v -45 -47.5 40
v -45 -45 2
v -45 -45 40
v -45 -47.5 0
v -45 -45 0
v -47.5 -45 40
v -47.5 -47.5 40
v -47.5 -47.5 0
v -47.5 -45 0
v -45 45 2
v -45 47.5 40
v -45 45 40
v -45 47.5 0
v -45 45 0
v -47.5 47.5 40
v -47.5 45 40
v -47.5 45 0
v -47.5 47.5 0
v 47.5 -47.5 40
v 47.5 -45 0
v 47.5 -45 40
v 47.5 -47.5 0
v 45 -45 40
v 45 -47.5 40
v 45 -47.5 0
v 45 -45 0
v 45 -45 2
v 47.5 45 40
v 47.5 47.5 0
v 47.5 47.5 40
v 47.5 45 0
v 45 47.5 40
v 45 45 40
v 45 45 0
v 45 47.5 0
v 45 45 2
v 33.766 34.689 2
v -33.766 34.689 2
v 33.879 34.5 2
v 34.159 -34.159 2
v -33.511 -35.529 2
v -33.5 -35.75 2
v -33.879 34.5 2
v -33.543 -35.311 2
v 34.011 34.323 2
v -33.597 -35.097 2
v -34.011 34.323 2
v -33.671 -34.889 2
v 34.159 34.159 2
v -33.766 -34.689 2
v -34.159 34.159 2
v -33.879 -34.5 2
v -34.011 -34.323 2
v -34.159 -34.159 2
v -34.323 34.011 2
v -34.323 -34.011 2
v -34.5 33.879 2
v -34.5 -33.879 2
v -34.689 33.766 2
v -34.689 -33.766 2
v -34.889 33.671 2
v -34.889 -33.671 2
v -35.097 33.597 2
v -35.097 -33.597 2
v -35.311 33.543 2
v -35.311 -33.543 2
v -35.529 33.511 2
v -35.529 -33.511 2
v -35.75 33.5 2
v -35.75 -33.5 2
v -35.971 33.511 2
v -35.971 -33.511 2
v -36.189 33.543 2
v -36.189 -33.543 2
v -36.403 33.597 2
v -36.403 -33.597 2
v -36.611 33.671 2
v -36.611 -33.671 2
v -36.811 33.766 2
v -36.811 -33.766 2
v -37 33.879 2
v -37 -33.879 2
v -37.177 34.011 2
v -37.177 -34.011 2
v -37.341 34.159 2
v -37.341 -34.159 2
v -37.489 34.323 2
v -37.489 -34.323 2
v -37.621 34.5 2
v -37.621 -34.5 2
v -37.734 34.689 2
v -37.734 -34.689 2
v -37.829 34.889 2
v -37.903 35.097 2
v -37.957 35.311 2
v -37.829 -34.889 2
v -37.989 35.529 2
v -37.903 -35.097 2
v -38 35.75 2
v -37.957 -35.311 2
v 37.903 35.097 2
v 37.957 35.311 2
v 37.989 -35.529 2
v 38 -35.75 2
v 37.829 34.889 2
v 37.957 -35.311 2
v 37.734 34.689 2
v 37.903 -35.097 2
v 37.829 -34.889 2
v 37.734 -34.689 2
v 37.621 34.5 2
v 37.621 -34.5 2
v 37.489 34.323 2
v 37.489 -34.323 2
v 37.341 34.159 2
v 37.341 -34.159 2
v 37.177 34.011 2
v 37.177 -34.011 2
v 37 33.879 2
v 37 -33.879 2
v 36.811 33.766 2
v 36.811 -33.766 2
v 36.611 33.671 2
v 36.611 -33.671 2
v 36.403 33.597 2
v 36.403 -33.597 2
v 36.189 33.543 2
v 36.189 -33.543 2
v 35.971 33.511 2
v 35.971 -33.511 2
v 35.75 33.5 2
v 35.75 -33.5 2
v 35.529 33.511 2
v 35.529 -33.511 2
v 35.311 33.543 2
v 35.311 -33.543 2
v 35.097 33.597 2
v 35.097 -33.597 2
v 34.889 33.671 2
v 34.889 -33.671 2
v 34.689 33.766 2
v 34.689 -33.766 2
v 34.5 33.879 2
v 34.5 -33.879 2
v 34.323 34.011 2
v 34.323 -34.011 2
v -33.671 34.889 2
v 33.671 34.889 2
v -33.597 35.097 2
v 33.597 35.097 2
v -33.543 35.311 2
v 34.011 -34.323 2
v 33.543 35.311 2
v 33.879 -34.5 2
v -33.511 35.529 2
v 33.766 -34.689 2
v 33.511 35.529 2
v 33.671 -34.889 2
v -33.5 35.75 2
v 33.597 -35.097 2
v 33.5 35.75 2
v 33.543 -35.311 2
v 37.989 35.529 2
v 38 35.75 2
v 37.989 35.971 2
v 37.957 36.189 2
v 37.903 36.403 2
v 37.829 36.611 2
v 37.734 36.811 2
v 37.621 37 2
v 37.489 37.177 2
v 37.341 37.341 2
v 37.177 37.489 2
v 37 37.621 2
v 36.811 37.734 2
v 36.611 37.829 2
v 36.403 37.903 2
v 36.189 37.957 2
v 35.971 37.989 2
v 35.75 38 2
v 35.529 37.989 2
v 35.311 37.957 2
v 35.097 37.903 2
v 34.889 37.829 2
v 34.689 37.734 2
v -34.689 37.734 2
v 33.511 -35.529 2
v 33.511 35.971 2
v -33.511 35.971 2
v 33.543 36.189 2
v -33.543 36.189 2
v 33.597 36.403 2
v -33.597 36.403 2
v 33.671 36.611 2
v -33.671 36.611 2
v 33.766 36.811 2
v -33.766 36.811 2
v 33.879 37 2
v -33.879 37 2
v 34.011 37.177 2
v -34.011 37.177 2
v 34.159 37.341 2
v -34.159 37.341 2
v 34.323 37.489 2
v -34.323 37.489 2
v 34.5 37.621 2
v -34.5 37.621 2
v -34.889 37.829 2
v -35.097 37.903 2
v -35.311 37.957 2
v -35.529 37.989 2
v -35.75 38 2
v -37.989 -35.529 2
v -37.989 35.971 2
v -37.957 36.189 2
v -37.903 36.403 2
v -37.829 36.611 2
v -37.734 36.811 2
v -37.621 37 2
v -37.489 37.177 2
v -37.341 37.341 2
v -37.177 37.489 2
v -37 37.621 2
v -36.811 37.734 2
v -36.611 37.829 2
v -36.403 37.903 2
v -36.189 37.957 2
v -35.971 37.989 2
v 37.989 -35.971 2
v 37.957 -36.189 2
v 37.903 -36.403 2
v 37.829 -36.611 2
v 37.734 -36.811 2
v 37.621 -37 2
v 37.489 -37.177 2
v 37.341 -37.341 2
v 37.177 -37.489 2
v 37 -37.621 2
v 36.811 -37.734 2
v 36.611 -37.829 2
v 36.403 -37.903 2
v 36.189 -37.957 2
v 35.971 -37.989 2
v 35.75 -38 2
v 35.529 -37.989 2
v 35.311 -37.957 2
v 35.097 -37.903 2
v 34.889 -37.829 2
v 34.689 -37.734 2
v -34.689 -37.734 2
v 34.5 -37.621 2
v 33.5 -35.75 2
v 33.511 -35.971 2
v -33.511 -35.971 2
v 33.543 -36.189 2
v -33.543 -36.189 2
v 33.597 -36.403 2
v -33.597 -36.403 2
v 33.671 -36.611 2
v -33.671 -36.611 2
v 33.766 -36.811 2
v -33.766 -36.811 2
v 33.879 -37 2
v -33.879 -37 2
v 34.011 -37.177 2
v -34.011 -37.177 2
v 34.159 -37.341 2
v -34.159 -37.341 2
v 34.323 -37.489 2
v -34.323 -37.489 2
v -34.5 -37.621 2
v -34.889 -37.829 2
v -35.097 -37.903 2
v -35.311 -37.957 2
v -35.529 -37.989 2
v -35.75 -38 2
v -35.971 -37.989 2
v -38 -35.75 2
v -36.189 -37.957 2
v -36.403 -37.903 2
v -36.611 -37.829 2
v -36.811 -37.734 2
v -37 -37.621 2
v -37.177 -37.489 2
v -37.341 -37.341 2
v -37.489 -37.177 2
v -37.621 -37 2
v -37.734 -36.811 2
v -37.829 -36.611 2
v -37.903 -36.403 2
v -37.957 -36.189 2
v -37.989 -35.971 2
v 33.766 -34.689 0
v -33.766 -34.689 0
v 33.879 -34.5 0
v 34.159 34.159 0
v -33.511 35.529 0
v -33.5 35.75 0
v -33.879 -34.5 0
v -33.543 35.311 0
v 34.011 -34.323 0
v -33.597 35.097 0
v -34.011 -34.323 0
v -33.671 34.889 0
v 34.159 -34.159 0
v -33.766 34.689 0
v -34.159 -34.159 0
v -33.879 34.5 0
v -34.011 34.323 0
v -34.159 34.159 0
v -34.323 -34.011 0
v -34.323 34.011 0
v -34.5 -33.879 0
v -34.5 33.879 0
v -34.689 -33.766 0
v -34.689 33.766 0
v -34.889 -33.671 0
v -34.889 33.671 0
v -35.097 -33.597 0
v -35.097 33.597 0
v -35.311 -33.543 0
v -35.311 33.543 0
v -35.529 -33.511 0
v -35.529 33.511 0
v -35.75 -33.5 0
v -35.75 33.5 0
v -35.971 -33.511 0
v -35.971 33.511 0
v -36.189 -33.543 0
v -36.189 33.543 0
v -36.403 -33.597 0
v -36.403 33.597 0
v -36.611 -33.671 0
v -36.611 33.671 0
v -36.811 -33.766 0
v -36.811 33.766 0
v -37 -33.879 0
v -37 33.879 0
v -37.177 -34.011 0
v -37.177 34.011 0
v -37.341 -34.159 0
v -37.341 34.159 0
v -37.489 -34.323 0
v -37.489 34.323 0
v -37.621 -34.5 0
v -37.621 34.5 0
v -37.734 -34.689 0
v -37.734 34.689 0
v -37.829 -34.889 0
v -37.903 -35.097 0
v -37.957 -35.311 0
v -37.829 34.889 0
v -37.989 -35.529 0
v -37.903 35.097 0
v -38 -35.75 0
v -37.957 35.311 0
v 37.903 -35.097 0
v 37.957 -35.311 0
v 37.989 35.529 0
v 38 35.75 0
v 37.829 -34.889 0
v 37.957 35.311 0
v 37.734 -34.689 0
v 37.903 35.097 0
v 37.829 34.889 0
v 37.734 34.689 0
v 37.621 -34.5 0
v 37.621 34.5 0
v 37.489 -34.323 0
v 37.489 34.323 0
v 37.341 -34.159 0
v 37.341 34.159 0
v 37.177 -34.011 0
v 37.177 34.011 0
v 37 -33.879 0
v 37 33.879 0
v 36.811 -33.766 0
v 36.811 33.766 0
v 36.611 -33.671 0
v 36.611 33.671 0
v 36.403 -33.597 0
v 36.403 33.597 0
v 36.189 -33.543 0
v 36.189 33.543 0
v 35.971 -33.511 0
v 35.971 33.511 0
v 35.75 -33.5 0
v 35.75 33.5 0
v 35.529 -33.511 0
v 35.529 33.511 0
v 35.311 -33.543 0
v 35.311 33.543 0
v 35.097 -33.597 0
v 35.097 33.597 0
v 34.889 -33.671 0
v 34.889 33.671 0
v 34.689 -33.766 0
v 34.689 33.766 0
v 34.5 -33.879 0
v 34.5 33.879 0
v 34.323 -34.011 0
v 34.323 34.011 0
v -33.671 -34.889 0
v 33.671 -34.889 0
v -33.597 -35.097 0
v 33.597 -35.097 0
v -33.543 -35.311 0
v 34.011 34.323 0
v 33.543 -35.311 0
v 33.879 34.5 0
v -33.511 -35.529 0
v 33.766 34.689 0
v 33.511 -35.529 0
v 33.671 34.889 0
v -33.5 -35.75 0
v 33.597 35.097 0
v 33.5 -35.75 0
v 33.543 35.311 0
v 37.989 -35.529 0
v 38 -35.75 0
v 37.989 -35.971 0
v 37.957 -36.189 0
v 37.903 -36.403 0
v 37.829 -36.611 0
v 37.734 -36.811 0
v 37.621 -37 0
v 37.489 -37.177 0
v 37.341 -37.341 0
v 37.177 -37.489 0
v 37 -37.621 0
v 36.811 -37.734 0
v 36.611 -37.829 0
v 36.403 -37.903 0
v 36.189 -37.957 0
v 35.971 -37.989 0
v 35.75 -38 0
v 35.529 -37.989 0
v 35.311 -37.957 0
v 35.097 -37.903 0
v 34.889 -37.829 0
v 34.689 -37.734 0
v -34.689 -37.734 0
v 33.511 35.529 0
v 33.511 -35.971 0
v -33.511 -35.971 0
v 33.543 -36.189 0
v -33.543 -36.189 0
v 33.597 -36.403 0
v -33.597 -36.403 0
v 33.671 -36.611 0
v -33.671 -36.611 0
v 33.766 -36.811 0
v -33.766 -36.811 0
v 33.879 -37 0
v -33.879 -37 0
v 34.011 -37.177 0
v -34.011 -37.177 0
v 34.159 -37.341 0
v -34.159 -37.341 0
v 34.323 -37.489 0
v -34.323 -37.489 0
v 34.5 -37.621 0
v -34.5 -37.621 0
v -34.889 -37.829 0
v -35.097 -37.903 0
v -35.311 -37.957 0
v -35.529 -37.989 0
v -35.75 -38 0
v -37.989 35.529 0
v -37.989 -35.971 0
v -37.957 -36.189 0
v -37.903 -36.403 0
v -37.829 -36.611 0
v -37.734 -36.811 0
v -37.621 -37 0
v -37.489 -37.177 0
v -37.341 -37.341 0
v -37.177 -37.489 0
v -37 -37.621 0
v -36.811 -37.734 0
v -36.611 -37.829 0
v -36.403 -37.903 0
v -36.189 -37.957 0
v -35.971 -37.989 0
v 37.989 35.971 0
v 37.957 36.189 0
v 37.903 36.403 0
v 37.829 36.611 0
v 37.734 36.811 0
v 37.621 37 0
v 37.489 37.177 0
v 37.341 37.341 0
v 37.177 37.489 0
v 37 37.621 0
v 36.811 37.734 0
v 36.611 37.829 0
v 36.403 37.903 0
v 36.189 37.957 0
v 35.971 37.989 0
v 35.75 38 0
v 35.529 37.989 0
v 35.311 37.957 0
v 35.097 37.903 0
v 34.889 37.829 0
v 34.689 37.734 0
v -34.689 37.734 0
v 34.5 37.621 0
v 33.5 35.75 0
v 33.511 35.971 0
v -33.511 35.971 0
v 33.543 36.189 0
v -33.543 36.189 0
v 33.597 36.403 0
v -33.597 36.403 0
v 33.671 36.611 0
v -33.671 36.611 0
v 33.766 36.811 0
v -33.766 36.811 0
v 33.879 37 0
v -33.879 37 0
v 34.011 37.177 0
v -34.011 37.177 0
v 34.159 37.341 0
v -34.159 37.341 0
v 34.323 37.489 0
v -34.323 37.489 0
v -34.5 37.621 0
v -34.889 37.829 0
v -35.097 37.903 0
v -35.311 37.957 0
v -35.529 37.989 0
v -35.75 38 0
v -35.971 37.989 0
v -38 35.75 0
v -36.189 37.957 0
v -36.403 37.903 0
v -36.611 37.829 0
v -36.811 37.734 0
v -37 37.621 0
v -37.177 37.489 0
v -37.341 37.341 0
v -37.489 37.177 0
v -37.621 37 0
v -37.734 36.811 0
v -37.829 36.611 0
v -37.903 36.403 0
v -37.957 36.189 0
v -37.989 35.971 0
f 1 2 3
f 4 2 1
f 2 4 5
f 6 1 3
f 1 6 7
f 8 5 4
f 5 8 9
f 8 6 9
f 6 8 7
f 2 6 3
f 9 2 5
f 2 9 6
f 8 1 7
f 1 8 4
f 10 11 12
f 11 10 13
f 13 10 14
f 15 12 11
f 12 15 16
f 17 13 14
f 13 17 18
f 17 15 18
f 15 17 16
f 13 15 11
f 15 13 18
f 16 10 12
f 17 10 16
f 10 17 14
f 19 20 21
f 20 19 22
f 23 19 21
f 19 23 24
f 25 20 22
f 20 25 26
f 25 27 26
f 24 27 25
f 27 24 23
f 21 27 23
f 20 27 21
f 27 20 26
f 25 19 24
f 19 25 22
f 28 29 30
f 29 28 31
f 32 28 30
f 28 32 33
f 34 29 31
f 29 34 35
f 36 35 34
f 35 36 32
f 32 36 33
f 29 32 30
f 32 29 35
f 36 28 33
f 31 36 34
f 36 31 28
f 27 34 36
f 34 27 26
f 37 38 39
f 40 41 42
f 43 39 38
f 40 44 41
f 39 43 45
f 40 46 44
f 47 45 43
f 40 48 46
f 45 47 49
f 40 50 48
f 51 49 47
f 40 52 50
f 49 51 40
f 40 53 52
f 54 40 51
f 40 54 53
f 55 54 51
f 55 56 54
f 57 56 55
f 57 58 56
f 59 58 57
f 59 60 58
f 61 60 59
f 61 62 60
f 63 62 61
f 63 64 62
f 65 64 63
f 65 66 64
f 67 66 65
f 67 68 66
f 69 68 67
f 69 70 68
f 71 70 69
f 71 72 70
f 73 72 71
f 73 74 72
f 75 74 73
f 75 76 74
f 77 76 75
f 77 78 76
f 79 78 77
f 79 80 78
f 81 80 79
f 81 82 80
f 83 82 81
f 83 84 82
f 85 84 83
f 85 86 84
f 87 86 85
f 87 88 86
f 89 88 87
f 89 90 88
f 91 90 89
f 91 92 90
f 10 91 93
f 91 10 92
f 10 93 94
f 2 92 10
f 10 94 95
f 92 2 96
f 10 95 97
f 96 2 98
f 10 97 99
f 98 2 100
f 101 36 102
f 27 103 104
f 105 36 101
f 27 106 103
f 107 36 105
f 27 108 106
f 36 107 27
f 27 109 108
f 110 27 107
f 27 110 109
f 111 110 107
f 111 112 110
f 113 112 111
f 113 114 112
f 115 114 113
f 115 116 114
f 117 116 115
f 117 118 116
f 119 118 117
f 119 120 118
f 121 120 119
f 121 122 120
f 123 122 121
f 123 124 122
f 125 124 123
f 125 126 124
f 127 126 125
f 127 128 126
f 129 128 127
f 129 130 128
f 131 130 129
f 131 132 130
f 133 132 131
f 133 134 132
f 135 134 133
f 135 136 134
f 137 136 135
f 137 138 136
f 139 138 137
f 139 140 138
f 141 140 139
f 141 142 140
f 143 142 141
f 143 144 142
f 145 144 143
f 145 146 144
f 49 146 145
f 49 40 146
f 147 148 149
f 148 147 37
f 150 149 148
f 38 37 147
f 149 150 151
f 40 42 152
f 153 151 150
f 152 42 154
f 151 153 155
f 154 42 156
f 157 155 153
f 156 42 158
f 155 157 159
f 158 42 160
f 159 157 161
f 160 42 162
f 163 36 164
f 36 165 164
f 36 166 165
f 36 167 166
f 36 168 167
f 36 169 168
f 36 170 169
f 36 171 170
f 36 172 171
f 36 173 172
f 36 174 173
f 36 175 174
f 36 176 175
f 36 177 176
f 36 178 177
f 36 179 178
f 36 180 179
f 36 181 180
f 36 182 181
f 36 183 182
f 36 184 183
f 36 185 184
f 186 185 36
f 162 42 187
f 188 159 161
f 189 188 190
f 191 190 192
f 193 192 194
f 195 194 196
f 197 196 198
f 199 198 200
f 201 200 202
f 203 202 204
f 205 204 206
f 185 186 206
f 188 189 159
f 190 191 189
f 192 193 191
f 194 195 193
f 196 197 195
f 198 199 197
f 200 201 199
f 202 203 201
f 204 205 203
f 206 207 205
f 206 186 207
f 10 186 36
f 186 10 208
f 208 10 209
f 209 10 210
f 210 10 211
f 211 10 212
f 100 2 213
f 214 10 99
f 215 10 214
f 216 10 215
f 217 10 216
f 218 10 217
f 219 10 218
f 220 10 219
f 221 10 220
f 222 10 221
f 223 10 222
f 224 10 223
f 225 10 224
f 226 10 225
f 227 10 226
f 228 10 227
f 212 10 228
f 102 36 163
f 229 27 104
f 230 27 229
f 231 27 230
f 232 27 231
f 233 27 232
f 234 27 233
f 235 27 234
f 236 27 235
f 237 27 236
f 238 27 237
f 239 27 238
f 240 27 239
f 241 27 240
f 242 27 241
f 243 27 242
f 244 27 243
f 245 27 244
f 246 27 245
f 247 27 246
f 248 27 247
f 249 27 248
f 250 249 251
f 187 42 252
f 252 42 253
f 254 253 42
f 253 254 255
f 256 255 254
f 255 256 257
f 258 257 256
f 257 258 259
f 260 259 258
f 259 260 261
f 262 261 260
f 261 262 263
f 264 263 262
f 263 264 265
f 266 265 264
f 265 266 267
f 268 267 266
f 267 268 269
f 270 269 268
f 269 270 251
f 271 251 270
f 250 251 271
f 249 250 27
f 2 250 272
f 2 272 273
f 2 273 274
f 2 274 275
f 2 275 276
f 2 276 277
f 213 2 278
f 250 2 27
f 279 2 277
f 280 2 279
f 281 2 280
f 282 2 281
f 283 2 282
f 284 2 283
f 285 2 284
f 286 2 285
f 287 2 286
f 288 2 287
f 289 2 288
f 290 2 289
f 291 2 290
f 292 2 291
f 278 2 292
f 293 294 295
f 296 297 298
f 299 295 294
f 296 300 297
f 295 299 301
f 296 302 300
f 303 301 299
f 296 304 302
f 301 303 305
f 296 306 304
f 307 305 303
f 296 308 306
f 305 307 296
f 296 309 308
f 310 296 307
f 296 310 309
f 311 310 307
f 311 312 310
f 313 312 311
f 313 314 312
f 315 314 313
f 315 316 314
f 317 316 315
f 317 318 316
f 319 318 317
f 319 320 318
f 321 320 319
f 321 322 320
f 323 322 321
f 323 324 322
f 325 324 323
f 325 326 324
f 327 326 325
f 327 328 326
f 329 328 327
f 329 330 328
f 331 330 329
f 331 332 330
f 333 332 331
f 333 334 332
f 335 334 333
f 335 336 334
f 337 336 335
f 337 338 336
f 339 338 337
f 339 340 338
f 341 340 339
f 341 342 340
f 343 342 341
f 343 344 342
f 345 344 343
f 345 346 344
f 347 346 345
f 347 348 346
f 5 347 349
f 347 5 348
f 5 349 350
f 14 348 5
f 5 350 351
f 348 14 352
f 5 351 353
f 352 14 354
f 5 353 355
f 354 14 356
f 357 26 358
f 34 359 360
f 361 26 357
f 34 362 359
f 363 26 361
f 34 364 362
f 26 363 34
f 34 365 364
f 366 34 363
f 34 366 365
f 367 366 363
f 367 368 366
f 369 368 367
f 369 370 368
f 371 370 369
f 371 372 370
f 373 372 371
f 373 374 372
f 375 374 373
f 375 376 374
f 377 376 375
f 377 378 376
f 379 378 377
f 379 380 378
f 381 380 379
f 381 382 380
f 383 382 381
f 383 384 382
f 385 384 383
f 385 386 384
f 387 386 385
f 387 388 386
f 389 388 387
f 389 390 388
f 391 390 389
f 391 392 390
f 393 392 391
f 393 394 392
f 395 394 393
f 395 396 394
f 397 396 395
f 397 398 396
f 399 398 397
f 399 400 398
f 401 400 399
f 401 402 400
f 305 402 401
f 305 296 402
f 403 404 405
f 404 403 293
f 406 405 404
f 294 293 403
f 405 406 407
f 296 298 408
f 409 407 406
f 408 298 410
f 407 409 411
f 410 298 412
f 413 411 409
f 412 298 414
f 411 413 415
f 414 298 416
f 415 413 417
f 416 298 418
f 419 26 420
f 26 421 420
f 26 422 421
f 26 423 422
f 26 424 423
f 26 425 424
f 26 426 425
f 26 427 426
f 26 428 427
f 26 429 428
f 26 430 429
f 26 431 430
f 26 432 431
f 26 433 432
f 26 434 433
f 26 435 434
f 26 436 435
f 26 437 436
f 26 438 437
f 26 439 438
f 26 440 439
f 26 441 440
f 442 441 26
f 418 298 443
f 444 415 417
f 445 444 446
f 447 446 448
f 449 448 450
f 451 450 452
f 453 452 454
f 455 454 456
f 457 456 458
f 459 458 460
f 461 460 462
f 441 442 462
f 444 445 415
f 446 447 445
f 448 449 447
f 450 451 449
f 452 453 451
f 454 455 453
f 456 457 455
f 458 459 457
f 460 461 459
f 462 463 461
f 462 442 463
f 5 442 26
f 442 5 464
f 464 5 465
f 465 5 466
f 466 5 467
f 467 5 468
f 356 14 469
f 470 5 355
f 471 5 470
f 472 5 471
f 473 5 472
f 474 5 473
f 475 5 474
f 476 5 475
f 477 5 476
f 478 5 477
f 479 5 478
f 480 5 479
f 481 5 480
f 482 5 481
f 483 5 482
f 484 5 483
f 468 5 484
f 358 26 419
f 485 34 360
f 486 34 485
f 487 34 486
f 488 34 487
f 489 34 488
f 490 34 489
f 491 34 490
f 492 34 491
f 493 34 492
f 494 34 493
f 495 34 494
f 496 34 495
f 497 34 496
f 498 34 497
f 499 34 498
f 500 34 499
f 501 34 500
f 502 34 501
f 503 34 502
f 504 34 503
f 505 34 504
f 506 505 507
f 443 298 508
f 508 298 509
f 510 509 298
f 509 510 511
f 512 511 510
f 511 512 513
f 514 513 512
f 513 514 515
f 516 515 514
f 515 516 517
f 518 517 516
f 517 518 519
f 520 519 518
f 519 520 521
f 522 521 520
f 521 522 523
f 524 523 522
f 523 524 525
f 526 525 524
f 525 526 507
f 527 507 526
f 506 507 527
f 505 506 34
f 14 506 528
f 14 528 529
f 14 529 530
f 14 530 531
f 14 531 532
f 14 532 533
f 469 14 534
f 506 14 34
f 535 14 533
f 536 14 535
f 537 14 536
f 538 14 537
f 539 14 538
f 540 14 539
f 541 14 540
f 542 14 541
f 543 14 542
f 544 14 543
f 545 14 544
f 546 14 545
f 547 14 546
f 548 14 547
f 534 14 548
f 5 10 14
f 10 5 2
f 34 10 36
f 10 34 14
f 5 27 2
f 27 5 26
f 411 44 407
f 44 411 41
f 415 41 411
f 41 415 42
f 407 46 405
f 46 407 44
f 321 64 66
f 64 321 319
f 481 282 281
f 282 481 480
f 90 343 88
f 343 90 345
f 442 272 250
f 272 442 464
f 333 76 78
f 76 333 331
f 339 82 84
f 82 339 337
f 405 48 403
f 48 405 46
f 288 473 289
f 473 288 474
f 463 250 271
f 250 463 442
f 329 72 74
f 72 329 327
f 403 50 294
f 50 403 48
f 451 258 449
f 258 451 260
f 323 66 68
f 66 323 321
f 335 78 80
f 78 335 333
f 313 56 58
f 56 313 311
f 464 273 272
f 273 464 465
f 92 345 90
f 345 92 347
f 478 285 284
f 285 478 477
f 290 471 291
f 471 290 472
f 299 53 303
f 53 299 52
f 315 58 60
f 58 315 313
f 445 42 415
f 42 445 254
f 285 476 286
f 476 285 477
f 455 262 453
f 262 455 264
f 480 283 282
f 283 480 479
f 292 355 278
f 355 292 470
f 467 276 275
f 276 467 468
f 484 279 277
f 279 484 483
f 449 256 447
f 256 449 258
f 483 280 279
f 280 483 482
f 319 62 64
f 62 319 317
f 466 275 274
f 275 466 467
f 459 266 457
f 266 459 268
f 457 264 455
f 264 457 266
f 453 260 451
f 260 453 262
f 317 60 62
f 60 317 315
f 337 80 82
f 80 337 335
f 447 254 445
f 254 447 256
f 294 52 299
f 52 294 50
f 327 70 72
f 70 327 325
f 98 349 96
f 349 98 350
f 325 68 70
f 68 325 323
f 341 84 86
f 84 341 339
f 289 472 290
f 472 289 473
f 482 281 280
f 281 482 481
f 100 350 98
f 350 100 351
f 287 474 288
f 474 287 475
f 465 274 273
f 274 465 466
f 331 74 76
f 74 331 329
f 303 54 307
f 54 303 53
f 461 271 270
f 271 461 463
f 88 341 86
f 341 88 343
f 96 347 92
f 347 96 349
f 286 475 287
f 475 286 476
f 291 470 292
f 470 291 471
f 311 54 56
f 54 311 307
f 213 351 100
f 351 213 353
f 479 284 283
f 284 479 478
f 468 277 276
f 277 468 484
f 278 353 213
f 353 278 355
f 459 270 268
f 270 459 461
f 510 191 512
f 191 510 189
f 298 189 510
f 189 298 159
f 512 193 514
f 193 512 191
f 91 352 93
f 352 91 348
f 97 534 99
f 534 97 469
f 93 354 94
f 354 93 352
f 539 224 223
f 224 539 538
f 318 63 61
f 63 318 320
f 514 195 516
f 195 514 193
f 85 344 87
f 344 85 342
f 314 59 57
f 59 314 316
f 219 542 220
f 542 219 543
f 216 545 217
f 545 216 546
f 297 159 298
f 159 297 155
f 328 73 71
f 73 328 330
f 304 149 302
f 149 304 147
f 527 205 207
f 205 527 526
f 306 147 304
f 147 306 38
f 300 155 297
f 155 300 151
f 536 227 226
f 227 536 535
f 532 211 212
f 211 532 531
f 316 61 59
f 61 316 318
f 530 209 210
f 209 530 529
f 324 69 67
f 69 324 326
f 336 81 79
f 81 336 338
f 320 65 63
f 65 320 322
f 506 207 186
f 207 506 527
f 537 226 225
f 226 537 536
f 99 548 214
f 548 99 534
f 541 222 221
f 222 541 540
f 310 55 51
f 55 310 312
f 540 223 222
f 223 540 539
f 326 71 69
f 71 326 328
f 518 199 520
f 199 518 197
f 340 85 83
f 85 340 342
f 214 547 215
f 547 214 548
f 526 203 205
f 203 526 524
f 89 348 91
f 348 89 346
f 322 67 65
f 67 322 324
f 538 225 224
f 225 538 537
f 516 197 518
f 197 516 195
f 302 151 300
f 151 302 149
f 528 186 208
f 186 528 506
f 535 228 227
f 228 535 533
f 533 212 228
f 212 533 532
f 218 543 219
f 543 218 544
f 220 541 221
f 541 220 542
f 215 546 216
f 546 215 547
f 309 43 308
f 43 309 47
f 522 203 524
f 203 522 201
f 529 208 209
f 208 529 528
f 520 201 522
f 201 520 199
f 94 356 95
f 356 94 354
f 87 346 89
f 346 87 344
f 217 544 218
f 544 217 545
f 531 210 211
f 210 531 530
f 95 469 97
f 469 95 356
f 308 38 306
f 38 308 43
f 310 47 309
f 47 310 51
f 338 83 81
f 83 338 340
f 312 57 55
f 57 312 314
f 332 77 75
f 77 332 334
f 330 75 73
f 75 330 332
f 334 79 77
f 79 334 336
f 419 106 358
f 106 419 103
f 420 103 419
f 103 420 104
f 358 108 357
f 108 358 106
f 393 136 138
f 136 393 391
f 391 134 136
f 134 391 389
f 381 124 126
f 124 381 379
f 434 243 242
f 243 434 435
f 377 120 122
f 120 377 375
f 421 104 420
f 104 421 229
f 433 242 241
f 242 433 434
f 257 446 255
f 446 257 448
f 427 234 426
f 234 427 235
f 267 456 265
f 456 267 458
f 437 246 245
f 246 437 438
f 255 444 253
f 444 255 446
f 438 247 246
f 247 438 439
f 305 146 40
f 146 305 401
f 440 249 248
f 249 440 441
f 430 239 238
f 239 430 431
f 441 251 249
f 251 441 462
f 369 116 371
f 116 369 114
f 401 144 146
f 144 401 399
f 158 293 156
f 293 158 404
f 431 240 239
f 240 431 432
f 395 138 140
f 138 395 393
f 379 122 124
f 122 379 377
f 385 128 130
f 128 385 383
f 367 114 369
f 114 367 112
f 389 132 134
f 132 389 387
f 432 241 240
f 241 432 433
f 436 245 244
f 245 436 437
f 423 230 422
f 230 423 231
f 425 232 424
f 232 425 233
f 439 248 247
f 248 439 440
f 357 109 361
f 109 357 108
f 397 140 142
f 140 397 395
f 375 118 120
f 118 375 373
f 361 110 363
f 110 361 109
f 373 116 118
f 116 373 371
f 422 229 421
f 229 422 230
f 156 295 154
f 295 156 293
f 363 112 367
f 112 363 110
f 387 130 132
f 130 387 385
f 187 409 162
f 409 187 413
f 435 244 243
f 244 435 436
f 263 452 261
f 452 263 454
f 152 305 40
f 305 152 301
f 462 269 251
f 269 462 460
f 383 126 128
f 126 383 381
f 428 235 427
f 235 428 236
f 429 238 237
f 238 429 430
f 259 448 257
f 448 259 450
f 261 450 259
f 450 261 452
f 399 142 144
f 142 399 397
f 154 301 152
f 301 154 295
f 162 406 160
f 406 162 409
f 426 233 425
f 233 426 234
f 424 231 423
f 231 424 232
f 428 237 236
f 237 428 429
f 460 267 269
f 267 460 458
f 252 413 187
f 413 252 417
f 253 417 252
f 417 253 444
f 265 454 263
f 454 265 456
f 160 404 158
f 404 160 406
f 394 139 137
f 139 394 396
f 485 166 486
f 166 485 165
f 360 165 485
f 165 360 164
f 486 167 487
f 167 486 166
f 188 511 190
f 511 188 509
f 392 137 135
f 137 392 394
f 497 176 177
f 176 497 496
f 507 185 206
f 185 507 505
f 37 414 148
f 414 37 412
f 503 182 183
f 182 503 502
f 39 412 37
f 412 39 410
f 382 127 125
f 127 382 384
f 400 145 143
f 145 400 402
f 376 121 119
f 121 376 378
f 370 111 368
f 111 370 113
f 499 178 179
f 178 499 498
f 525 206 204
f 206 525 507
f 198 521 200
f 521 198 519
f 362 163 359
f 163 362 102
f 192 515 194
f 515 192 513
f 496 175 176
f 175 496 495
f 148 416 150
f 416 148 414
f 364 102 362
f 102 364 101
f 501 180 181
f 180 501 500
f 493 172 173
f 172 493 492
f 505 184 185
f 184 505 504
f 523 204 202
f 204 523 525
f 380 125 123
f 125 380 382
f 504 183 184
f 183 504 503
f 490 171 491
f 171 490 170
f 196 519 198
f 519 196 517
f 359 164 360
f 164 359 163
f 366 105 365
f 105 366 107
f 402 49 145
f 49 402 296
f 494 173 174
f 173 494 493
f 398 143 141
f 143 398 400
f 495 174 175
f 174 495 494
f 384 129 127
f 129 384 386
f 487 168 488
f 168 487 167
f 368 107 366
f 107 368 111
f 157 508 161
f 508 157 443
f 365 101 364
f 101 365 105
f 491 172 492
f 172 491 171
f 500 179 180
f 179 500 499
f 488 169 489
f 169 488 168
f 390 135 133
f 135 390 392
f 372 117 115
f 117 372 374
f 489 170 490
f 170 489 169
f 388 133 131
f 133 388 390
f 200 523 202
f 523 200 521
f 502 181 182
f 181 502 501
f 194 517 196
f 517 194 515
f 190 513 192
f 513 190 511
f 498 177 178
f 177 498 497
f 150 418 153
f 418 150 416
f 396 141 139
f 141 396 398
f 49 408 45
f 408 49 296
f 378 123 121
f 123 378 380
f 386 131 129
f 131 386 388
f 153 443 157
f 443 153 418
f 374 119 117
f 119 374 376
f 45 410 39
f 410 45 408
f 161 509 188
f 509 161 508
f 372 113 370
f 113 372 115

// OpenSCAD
// DIY magnetic stirrer housing - print orientation (upside down)
// Units: mm. Walls 2.5 mm thick. Top plate 2 mm thick.

$fn = 64;

// --- Dimensions ---
fan_d          = 80;    // fan diameter
outer_x        = 90;    // outer size in X
outer_y        = 90;    // outer size in Y
wall           = 2.5;   // wall thickness
top_plate      = 2;     // top plate thickness
box_height     = 40;    // total height of box (open at top)
screw_hole     = 4.5;   // M4 screw hole diameter
screw_pattern  = 71.5;  // square pitch of screw holes
notch_w        = 12;    // cable notch width
notch_depth    = 8;     // notch depth from open edge
eps            = 0.5;   // cutter overshoot

// --- Model ---
difference() {
    union() {
        // Top plate on bed
        translate([-outer_x/2, -outer_y/2, 0])
            cube([outer_x, outer_y, top_plate]);

        // Four walls rising to box_height
        for (dx = [-outer_x/2 - wall, outer_x/2])
            for (dy = [-outer_y/2 - wall, outer_y/2])
                translate([dx, dy, 0])
                    cube([wall, wall, box_height]);
    }

    // Four M4 screw holes through top plate, centred
    for (sx = [-screw_pattern/2, screw_pattern/2],
         sy = [-screw_pattern/2, screw_pattern/2])
        translate([sx, sy, -eps])
            cylinder(d = screw_hole, h = top_plate + 2*eps);

    // Cable notch in one wall, centred along the wall
    translate([-outer_x/2 - wall, 0, box_height - notch_depth])
        cube([wall, notch_w, notch_depth + eps]);
}
